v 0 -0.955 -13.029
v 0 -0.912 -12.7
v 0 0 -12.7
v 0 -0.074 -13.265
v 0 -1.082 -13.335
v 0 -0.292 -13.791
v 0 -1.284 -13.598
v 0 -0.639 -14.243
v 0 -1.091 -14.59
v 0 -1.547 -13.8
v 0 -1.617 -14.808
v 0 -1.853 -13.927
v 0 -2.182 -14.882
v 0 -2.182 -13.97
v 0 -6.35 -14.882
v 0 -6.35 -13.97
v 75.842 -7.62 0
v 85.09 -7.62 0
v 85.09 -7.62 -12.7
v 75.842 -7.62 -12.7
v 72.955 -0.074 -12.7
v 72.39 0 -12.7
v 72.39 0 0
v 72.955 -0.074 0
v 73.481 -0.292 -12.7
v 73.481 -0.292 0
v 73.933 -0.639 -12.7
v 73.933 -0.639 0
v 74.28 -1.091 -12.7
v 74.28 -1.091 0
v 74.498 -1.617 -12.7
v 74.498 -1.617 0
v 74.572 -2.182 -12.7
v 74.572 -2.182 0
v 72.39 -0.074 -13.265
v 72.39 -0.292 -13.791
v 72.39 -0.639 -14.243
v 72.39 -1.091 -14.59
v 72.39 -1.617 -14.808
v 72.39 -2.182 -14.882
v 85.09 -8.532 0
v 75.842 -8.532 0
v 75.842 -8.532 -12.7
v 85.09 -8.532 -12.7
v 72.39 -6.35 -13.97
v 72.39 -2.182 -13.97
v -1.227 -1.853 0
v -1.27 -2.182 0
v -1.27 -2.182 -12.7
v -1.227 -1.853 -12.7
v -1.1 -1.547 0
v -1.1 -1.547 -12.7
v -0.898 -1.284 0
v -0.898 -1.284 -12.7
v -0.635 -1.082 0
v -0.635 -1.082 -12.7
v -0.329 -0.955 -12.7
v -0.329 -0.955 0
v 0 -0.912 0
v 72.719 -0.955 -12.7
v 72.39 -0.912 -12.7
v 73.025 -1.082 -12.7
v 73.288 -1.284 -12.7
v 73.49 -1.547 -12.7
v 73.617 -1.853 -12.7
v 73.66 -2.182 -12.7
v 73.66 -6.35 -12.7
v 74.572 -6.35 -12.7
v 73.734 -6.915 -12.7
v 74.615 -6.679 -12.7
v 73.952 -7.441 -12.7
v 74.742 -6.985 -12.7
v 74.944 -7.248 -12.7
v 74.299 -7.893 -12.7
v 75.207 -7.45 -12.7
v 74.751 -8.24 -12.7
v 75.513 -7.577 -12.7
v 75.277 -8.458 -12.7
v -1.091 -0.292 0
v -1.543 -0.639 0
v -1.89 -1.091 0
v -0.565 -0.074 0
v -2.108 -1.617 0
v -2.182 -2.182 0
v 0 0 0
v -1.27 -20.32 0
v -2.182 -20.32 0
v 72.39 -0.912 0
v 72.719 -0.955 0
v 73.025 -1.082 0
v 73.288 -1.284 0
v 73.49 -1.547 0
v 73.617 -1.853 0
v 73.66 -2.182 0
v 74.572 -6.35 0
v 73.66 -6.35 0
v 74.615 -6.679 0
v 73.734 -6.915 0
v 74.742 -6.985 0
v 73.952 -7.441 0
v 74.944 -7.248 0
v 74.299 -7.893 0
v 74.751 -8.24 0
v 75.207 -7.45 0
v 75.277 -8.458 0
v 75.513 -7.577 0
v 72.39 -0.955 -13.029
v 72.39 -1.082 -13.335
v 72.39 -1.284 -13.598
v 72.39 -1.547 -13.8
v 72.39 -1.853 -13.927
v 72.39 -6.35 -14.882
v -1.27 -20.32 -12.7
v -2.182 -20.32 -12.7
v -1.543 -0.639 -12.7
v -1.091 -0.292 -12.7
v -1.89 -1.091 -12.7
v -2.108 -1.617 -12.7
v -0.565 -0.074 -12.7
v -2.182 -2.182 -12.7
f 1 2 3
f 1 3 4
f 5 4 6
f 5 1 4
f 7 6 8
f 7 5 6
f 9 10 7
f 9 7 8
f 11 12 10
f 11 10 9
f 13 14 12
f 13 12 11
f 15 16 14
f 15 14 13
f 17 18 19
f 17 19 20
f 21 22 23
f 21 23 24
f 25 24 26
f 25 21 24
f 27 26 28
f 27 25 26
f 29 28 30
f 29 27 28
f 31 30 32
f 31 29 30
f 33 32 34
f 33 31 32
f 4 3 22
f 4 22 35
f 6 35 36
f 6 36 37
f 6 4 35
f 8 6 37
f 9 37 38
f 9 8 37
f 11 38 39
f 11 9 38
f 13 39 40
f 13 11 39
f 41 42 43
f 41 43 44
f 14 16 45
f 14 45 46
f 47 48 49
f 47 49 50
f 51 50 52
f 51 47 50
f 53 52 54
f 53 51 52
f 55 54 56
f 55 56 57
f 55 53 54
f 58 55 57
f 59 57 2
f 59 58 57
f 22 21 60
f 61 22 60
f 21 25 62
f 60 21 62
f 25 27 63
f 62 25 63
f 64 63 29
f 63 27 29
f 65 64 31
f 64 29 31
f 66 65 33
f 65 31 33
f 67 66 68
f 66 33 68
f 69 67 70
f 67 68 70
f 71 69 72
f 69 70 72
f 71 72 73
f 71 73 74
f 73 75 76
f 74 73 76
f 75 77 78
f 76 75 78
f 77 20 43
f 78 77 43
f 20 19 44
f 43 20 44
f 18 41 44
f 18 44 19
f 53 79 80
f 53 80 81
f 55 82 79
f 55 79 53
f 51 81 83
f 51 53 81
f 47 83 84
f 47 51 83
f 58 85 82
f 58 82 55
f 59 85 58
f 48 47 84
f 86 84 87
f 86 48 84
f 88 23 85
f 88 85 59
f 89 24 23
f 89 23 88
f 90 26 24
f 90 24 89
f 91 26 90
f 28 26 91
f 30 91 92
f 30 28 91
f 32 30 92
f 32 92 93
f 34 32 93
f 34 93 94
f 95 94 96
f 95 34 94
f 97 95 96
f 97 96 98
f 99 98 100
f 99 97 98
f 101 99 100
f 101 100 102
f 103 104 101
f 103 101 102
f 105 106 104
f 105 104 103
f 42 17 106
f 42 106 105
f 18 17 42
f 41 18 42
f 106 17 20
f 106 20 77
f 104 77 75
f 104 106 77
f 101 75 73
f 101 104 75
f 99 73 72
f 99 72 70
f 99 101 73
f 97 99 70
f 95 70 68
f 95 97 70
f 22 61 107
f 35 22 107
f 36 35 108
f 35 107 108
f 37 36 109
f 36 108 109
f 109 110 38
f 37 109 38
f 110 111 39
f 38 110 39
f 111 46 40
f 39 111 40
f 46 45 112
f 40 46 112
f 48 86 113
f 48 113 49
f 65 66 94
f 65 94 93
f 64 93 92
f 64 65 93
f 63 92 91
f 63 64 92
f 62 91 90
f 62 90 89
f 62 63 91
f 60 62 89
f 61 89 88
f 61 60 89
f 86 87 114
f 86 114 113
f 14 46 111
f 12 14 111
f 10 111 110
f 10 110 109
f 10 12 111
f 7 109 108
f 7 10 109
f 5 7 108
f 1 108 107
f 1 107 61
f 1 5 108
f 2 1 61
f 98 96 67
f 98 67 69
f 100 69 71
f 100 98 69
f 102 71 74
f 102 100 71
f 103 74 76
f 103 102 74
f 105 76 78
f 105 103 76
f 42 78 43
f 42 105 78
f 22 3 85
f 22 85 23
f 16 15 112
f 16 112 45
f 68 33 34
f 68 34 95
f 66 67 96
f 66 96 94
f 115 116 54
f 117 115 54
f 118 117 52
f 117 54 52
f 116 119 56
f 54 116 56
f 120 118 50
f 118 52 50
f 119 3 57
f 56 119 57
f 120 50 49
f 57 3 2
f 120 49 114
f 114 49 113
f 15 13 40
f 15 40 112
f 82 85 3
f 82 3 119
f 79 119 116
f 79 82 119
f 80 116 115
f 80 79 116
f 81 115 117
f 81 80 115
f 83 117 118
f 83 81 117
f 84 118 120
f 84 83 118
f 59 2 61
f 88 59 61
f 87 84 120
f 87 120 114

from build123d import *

# Parameters (mm, degrees)
SKETCH1_W          = 72.39
SKETCH1_H          = 12.7
BASE_FLANGE1_DEPTH = 0.91186
EDGE_FLANGE1_DEPTH = 12.7
EDGE_FLANGE2_DEPTH = 12.7
EDGE_FLANGE3_DEPTH = 12.7
EDGE_FLANGE4_DEPTH = 72.39


# Sheet-metal steps are written as plain solids
with BuildPart() as part:
    # Sketch1 → Base-Flange1 (new body)
    with BuildSketch(Plane(origin=(0, 0, 0), x_dir=(1, 0, 0), z_dir=(0, 1, 0))):
        with Locations((36.195, 6.35)):
            Rectangle(SKETCH1_W, SKETCH1_H)
    extrude(amount=-BASE_FLANGE1_DEPTH)

    # Edge-Flange1 section (across the edge) → Edge-Flange1 (add)
    with BuildSketch(Plane(origin=(-1.27, -0.91186, 0), x_dir=(1, 0, 0), z_dir=(0, 0, -1))):
        with BuildLine():
            Line((-0.91186, 1.27), (-0.91186, 19.40814))
            Line((-0.91186, 19.40814), (0, 19.40814))
            Line((0, 19.40814), (0, 1.27))
            ThreePointArc((0, 1.27), (0.371974388, 0.371974388), (1.27, 0))
            Line((1.27, 0), (1.27, -0.91186))
            ThreePointArc((1.27, -0.91186), (-0.272808002, -0.272808002), (-0.91186, 1.27))
        make_face()
    extrude(amount=EDGE_FLANGE1_DEPTH)

    # Edge-Flange2 section (across the edge) → Edge-Flange2 (add)
    with BuildSketch(Plane(origin=(73.66, -0.91186, -12.7), x_dir=(-1, 0, 0), z_dir=(0, 0, 1))):
        with BuildLine():
            Line((-0.91186, 1.27), (-0.91186, 5.43814))
            Line((-0.91186, 5.43814), (0, 5.43814))
            Line((0, 5.43814), (0, 1.27))
            ThreePointArc((0, 1.27), (0.371974388, 0.371974388), (1.27, 0))
            Line((1.27, 0), (1.27, -0.91186))
            ThreePointArc((1.27, -0.91186), (-0.272808002, -0.272808002), (-0.91186, 1.27))
        make_face()
    extrude(amount=EDGE_FLANGE2_DEPTH)

    # Edge-Flange3 section (across the edge) → Edge-Flange3 (add)
    with BuildSketch(Plane(origin=(74.57186, -7.62, 0), x_dir=(0, 1, 0), z_dir=(0, 0, -1))):
        with BuildLine():
            Line((-0.91186, 1.27), (-0.91186, 10.51814))
            Line((-0.91186, 10.51814), (0, 10.51814))
            Line((0, 10.51814), (0, 1.27))
            ThreePointArc((0, 1.27), (0.371974388, 0.371974388), (1.27, 0))
            Line((1.27, 0), (1.27, -0.91186))
            ThreePointArc((1.27, -0.91186), (-0.272808002, -0.272808002), (-0.91186, 1.27))
        make_face()
    extrude(amount=EDGE_FLANGE3_DEPTH)

    # Edge-Flange4 section (across the edge) → Edge-Flange4 (add)
    with BuildSketch(Plane(origin=(0, -0.91186, -13.97), x_dir=(0, 0, 1), z_dir=(1, 0, 0))):
        with BuildLine():
            Line((-0.91186, 1.27), (-0.91186, 5.43814))
            Line((-0.91186, 5.43814), (0, 5.43814))
            Line((0, 5.43814), (0, 1.27))
            ThreePointArc((0, 1.27), (0.371974388, 0.371974388), (1.27, 0))
            Line((1.27, 0), (1.27, -0.91186))
            ThreePointArc((1.27, -0.91186), (-0.272808002, -0.272808002), (-0.91186, 1.27))
        make_face()
    extrude(amount=EDGE_FLANGE4_DEPTH)


solid = part.part
